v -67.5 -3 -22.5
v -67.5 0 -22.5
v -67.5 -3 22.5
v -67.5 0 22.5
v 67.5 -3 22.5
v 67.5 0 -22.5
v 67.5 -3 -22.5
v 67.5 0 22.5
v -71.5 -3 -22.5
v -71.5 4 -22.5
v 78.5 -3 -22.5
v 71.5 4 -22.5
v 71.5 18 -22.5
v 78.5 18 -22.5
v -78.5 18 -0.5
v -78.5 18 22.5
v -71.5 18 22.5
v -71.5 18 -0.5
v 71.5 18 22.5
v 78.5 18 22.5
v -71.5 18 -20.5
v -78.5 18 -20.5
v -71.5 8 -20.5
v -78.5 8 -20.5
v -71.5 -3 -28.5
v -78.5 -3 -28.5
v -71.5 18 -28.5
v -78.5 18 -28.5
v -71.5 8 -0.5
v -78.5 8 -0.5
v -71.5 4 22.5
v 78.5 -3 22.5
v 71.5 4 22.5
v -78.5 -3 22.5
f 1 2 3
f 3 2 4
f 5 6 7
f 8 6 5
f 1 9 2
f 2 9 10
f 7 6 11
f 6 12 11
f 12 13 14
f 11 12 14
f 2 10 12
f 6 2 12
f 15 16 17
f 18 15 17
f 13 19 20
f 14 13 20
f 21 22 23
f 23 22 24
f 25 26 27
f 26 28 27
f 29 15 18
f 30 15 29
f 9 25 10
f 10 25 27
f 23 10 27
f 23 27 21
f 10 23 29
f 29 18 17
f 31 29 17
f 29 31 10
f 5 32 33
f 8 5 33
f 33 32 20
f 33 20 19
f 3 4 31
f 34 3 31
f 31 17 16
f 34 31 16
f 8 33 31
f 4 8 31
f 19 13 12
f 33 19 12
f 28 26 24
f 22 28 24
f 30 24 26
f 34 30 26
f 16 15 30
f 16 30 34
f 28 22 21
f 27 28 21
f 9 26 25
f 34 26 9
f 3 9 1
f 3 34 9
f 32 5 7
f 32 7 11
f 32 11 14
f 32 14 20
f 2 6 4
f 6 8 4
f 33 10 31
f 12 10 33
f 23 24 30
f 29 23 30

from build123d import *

# Parameters (mm, degrees)
F0_W      = 7
F0_H      = 45
F0_W_2    = 4
F1_DEPTH  = 18
F2_W      = 143
F2_H      = 14
F3_DEPTH  = 55
F4_DEPTH  = 6
F5_W      = 10
F5_H      = 20
F6_DEPTH  = 25
F7_DEPTH  = 3
F9_W      = 7
F9_H      = 6
F10_DEPTH = 3


with BuildPart() as f1:
    # F0 (on Front) → F1 (new body)
    with BuildSketch(Plane.XZ):
        with Locations((71, 0)):
            Rectangle(F0_W, F0_H)
        Polygon((67.5, -22.5), (67.5, 22.5), (-67.5, 22.5), (-67.5, -22.5), (0, -22.5), align=None)
        with Locations((-71, 0)):
            Rectangle(F0_W, F0_H)
        with Locations((-76.5, 0)):
            Rectangle(F0_W_2, F0_H)
        with Locations((76.5, 0)):
            Rectangle(F0_W_2, F0_H)
    extrude(amount=-F1_DEPTH)

    # F2 (on face) → F3 (cut)
    with BuildSketch(Plane(origin=(0, 0, -22.5), x_dir=(1, 0, 0), z_dir=(0, 0, -1))):
        with Locations((0, -11)):
            Rectangle(F2_W, F2_H)
    extrude(amount=-F3_DEPTH, mode=Mode.SUBTRACT)

    # F2 (on face) → F4 (join)
    with BuildSketch(Plane(origin=(0, 0, -22.5), x_dir=(1, 0, 0), z_dir=(0, 0, -1))):
        Polygon((-74.5, -18), (-71.5, -18), (-71.5, -4), (-71.5, 0), (-78.5, 0), (-78.5, -18), align=None)
    extrude(amount=F4_DEPTH)

    # F5 (on face) → F6 (cut)
    with BuildSketch(Plane(origin=(-78.5, 0, 0), x_dir=(0, -1, 0), z_dir=(-1, 0, 0))):
        with Locations((-13, -10.5)):
            Rectangle(F5_W, F5_H)
    extrude(amount=-F6_DEPTH, mode=Mode.SUBTRACT)


with BuildPart() as f7:
    # F0 (on Front) → F7 (new body)
    with BuildSketch(Plane.XZ):
        with Locations((71, 0)):
            Rectangle(F0_W, F0_H)
        with Locations((76.5, 0)):
            Rectangle(F0_W_2, F0_H)
    extrude(amount=F7_DEPTH)


with BuildPart() as f7b:
    # F0 (on Front) → F7, piece 2 (new body)
    with BuildSketch(Plane.XZ):
        with Locations((-71, 0)):
            Rectangle(F0_W, F0_H)
        with Locations((-76.5, 0)):
            Rectangle(F0_W_2, F0_H)
    extrude(amount=F7_DEPTH)


with BuildPart() as f7_1:
    add(f7.part)

    # F8: union F1, F7b
    add(f1.part)
    add(f7b.part)

    # F9 (on face) → F10 (join)
    with BuildSketch(Plane.XZ):
        with Locations((-75, -25.5)):
            Rectangle(F9_W, F9_H)
    extrude(amount=F10_DEPTH)


solid = f7_1.part
